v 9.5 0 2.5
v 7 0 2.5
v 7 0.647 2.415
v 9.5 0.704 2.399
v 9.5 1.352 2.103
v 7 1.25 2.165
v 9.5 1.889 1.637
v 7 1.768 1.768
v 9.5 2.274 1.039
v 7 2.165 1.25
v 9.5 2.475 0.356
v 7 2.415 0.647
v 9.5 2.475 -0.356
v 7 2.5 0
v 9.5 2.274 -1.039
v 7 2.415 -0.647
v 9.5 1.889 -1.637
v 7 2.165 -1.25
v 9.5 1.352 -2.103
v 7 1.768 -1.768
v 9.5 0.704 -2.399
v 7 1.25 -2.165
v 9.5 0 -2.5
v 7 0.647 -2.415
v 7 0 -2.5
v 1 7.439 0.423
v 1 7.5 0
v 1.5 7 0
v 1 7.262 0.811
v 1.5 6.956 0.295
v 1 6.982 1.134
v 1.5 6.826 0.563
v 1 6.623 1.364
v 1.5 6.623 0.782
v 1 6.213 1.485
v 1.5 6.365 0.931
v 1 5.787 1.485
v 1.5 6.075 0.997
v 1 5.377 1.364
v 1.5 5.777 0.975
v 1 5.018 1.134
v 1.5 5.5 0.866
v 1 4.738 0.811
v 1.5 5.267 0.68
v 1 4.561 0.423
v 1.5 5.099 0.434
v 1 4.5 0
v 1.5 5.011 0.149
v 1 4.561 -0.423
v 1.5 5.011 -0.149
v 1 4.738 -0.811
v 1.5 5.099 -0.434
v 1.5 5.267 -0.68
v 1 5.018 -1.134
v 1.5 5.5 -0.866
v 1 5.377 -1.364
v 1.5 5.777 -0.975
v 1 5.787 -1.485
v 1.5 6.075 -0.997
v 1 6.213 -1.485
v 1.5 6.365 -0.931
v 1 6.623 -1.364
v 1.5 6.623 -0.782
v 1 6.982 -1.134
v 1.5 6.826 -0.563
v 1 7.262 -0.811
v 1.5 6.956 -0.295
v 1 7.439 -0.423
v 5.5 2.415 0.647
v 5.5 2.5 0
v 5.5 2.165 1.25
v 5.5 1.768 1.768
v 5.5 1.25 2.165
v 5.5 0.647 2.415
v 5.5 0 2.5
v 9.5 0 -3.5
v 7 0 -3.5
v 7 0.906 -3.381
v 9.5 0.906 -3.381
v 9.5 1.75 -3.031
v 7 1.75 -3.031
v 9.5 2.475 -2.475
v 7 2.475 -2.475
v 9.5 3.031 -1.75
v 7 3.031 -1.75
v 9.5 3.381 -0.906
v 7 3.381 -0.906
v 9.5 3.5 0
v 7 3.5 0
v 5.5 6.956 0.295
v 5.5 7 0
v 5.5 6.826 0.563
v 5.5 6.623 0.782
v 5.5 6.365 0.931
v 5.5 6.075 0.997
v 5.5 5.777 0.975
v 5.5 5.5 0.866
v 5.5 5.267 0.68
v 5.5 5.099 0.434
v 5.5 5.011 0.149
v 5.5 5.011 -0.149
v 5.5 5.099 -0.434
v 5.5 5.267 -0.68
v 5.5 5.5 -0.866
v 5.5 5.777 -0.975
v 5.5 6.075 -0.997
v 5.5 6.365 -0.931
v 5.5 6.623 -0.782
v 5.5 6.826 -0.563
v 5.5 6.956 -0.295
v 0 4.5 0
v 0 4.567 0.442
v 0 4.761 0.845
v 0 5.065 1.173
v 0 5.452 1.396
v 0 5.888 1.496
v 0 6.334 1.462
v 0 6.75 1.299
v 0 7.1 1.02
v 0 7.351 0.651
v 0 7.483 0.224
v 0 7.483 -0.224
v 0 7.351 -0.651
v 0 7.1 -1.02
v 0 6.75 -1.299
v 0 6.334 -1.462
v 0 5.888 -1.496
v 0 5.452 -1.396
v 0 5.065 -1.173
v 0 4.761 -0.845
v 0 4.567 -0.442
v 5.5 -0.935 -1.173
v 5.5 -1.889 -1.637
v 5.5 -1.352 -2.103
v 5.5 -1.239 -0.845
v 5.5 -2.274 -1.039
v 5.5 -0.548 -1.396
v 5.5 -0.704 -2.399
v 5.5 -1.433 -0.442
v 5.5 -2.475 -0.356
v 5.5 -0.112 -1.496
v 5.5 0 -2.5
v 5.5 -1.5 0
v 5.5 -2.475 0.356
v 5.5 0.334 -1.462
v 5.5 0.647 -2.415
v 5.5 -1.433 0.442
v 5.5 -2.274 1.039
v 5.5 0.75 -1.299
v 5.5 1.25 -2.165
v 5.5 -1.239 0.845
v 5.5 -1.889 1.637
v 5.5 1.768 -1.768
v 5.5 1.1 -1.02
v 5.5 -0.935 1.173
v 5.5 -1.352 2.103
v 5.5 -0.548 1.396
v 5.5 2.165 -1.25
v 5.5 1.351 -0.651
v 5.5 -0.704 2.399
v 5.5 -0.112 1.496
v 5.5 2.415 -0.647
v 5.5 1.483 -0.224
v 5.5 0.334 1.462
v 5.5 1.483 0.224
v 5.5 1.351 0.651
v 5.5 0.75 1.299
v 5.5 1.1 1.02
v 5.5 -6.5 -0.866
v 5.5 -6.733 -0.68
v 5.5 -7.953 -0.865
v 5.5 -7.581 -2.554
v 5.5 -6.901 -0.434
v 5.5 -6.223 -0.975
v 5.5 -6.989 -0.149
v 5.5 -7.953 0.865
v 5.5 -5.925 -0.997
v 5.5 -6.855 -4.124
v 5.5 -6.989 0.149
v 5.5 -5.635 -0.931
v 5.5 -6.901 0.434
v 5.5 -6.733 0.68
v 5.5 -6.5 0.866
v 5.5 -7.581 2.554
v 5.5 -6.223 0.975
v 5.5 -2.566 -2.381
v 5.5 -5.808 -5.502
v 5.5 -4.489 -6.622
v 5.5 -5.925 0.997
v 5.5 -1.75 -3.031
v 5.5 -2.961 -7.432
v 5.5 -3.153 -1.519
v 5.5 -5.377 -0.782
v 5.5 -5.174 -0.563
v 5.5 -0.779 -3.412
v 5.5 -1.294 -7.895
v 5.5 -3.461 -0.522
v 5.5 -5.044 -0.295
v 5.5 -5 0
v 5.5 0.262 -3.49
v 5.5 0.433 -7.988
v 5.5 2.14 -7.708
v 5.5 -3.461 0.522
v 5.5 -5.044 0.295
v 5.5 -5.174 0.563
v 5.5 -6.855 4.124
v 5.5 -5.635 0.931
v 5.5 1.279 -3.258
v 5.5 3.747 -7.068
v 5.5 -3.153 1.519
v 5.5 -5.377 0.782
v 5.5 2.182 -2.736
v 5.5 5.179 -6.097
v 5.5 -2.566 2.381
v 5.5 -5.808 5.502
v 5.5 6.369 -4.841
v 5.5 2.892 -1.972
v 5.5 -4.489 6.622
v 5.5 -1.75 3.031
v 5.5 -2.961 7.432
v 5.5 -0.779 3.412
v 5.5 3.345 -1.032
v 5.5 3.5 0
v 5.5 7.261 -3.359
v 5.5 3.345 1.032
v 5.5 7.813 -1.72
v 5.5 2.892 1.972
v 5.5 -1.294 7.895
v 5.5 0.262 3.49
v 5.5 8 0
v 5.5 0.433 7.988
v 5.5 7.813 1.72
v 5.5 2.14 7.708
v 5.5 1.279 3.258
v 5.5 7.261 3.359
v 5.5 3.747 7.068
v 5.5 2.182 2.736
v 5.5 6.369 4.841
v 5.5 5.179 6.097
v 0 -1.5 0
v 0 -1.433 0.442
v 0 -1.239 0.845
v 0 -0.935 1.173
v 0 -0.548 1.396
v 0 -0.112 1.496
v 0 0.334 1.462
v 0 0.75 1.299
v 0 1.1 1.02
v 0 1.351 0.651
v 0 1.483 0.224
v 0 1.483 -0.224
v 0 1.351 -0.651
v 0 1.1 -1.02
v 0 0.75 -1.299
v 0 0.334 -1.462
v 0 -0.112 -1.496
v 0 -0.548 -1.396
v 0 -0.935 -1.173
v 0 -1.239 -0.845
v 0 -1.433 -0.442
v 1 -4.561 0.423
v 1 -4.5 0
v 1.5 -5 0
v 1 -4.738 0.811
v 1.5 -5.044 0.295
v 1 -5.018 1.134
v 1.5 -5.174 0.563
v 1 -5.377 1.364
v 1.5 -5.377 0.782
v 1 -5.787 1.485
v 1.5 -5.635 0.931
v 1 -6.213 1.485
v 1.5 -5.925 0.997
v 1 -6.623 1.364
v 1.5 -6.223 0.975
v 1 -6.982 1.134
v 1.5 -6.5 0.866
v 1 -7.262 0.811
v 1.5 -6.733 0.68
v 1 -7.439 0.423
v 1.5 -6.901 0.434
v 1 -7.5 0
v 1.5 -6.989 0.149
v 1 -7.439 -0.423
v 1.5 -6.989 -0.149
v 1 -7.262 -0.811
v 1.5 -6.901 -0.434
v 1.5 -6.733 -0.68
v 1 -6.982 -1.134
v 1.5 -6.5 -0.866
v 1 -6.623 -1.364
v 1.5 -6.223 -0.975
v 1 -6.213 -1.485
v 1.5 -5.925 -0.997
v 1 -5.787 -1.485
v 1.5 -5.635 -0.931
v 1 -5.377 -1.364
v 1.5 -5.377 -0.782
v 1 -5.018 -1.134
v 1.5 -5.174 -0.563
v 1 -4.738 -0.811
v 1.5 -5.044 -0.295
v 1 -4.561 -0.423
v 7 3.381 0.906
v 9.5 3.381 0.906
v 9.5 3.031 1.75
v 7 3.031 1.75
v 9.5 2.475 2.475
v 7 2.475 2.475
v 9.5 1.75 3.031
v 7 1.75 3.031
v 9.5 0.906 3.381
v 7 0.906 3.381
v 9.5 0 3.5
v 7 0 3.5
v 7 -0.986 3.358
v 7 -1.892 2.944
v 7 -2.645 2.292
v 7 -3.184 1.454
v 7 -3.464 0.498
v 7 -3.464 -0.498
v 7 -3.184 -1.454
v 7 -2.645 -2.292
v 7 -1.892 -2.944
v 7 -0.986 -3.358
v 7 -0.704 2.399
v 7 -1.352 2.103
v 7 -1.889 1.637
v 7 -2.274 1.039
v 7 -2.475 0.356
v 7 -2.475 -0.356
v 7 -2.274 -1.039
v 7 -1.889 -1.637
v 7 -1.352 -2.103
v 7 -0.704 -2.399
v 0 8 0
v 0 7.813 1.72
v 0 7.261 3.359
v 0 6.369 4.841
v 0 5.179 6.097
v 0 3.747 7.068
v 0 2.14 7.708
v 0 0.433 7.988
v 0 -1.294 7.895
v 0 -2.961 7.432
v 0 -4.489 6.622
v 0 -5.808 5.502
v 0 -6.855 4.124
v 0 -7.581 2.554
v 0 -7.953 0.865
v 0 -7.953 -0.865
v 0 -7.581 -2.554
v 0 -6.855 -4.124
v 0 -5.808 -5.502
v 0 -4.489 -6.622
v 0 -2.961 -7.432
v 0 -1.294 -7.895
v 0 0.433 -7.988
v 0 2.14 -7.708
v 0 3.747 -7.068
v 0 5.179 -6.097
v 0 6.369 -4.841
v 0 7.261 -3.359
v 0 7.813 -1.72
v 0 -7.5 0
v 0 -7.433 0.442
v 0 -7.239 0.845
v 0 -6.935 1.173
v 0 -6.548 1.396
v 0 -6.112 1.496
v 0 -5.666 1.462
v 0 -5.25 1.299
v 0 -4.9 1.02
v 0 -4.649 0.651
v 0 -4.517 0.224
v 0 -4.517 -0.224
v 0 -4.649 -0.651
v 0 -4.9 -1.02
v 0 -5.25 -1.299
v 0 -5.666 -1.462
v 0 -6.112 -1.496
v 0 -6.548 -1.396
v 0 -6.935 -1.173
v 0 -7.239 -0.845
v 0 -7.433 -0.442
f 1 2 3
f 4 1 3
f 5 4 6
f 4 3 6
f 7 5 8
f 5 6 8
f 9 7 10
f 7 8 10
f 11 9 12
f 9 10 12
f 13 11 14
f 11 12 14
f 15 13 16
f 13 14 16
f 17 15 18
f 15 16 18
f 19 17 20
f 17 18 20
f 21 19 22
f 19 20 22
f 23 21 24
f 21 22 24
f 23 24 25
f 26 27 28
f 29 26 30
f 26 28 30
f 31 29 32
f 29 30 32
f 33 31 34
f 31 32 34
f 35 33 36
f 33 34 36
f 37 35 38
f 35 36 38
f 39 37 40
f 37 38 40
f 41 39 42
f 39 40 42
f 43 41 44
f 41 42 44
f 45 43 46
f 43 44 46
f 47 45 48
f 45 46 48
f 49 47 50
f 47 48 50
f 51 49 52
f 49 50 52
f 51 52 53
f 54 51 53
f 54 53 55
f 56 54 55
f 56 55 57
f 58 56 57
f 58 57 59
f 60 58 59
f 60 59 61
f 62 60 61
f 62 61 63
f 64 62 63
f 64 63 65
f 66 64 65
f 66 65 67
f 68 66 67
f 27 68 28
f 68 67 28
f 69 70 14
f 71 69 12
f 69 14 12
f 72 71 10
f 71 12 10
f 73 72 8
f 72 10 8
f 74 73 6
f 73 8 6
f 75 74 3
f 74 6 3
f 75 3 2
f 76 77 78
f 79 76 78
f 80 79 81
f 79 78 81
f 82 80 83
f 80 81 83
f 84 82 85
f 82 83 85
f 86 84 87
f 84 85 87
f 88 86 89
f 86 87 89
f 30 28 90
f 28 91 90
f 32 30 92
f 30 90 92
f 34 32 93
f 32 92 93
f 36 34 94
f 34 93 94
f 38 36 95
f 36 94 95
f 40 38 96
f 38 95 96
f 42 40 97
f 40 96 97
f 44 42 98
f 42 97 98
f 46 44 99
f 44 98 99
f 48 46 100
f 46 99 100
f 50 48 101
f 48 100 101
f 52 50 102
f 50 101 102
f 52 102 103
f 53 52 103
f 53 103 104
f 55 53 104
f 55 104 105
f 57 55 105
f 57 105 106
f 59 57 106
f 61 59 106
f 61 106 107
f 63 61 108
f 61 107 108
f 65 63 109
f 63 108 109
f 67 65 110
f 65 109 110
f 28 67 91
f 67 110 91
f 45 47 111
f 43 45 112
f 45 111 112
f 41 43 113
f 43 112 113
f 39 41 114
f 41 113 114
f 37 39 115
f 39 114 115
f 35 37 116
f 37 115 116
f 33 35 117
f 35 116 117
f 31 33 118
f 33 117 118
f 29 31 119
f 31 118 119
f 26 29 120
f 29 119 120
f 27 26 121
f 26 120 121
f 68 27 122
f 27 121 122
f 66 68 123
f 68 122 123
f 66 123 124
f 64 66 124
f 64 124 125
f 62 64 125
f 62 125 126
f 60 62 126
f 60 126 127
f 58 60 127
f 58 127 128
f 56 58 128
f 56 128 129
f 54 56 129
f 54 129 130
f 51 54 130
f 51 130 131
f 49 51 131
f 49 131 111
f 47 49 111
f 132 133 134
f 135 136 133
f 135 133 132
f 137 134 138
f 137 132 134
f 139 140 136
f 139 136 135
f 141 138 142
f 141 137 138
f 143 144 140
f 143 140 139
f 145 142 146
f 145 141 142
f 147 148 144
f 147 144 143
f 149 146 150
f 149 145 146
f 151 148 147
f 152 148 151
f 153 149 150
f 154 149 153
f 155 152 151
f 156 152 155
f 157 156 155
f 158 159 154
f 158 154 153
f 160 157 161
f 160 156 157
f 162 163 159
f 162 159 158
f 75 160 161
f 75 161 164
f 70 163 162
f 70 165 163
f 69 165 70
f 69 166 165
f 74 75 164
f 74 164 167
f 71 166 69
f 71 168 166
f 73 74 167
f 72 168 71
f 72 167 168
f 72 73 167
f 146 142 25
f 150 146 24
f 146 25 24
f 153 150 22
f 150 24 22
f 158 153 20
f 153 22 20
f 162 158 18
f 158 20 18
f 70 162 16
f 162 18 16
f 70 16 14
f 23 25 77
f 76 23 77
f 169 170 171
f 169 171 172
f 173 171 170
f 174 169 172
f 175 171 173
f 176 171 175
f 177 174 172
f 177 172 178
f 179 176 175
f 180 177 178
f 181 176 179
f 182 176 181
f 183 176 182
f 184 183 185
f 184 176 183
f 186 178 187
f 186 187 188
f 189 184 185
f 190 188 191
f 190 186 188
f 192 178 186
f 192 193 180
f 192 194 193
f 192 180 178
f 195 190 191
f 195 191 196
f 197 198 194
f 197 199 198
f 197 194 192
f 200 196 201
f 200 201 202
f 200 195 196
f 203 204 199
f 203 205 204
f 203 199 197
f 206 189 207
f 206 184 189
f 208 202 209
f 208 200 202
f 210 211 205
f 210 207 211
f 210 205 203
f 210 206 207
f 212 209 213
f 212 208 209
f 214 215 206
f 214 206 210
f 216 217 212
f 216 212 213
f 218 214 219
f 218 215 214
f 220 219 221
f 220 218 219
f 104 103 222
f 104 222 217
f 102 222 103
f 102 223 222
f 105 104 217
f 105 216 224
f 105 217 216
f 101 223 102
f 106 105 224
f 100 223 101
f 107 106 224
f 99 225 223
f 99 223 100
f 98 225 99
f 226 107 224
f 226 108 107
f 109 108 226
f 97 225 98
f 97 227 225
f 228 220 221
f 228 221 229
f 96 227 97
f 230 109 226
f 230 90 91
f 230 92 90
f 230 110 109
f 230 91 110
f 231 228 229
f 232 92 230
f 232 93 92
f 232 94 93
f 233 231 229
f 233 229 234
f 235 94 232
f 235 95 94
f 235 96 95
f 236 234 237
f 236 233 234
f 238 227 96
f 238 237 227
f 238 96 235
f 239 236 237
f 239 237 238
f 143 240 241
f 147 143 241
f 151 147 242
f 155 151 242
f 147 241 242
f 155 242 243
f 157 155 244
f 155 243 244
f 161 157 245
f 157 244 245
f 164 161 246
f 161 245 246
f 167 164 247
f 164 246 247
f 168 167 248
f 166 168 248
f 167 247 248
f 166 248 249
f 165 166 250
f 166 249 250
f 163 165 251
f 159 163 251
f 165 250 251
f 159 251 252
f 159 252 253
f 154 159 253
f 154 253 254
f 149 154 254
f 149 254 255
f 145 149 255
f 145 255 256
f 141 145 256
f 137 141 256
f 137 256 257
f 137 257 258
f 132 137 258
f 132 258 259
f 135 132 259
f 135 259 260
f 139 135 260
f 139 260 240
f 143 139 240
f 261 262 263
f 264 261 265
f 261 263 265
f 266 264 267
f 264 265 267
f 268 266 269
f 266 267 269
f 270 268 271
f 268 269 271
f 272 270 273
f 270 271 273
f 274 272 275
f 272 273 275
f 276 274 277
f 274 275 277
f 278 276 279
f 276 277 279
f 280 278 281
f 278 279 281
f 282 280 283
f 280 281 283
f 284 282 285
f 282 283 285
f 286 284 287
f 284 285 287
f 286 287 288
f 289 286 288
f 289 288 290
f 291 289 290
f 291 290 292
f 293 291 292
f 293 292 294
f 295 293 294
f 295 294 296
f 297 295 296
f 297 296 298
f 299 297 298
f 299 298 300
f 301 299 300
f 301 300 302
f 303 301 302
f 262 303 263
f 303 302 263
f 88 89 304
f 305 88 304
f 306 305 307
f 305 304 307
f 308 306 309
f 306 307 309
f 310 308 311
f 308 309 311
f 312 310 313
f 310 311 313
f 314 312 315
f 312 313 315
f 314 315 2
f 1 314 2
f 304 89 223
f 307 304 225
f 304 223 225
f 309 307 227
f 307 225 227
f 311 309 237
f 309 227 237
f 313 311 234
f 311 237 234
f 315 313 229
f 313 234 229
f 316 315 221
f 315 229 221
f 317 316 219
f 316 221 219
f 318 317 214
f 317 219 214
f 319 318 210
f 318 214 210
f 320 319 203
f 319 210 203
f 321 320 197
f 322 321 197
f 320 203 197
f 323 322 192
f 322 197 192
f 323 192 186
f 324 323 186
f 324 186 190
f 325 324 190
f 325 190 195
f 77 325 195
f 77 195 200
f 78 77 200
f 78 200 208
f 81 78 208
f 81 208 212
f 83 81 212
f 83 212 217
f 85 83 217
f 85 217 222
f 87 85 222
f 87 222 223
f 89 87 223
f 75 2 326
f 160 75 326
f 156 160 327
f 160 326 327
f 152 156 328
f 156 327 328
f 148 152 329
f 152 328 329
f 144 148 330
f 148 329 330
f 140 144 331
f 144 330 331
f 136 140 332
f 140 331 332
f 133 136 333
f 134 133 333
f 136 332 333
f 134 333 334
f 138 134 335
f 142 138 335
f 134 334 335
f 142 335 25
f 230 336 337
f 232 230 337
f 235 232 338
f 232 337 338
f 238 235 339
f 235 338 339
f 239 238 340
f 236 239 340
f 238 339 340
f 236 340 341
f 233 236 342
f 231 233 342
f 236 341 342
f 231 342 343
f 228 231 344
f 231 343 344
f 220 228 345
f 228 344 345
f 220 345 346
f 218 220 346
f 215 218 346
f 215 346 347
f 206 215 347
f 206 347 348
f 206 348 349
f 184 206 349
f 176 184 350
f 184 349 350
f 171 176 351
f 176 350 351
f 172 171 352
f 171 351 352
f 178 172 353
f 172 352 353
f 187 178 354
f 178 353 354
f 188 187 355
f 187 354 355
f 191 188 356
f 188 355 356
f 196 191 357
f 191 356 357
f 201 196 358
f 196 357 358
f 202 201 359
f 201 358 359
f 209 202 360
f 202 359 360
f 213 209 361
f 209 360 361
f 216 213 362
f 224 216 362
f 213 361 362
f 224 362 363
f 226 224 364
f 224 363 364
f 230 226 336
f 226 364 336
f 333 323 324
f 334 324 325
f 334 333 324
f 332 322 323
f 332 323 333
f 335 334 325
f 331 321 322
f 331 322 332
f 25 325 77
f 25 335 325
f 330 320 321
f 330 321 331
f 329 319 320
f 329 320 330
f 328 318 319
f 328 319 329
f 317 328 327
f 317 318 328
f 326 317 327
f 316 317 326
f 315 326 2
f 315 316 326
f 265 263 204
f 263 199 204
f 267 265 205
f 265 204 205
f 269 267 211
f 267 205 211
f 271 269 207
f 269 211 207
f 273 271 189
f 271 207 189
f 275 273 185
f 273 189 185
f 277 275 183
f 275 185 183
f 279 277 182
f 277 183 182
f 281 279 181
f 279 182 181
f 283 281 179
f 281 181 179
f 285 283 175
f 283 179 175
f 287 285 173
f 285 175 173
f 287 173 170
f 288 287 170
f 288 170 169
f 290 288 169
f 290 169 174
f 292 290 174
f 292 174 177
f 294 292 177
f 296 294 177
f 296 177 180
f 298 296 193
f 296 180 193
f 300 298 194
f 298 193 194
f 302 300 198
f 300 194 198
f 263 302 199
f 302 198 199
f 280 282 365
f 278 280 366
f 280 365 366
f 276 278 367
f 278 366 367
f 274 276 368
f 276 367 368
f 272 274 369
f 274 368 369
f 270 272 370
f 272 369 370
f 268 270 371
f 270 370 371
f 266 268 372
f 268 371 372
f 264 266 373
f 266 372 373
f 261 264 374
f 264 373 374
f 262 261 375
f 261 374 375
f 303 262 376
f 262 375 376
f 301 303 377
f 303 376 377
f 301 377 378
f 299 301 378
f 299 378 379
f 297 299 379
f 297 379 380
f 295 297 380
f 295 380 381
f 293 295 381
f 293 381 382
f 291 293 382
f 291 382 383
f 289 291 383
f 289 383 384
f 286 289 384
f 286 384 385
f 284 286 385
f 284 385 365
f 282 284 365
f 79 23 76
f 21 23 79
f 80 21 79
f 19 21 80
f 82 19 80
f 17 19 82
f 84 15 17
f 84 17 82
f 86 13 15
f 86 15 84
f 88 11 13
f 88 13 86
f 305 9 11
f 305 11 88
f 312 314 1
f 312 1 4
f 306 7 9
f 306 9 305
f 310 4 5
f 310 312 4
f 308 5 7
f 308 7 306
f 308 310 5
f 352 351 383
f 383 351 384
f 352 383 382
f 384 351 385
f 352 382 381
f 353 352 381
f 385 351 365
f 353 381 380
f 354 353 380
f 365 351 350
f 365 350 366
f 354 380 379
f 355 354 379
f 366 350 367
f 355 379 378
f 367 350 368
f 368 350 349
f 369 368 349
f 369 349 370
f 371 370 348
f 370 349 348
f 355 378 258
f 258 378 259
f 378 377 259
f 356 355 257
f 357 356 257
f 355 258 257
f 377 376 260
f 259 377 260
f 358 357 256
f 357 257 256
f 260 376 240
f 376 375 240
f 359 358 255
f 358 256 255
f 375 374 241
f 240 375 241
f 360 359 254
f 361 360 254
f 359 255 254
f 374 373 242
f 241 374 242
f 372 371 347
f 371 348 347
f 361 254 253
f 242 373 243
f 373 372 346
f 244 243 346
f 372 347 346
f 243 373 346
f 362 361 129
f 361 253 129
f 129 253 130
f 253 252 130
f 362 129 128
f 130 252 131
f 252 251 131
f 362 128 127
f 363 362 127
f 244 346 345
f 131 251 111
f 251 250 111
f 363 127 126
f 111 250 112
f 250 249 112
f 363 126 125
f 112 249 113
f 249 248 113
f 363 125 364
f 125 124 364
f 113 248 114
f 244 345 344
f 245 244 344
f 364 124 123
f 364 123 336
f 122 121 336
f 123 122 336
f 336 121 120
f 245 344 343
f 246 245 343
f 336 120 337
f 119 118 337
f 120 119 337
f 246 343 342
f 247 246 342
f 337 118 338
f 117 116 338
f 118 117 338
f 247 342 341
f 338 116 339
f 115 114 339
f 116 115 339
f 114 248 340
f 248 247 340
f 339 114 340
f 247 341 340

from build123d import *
from build123d import SkipClean  # not in build123d's __all__

# Parameters (mm, degrees)
F0_R            = 8
F1_DEPTH        = 5.5
F2_R            = 3.5
F3_DEPTH        = 1.5
F5_DEPTH        = 2.5
F7_DEPTH        = 1.5
F9_D            = 3
F10_R           = 1.5
F11_DEPTH       = 1
F13_D           = 2
F13_CSINK_D     = 3
F13_CSINK_ANGLE = 90


with BuildPart() as f1:
    # F0 (on Right) → F1 (new body)
    with BuildSketch(Plane.YZ):
        Circle(F0_R)
    extrude(amount=F1_DEPTH)

    # F2 (on face) → F3 (join)
    with BuildSketch(Plane.YZ.offset(5.5)):
        Circle(F2_R)
    extrude(amount=F3_DEPTH)

    # F4 (on face) → F5 (join)
    with BuildSketch(Plane.YZ.offset(7)):
        with BuildLine():
            Line((0, -2.5), (0, -3.5))
            ThreePointArc((0, -3.5), (2.4748737342, -2.4748737342), (3.5, 0))
            ThreePointArc((3.5, 0), (2.4748737342, 2.4748737342), (0, 3.5))
            Line((0, 3.5), (0, 2.5))
            ThreePointArc((0, 2.5), (2.5, 0), (0, -2.5))
        make_face()
    extrude(amount=F5_DEPTH)

    # F6 (on face) → F7 (cut)
    with BuildSketch(Plane.YZ.offset(7)):
        with BuildLine():
            ThreePointArc((0, -2.5), (1.767766953, -1.767766953), (2.5, 0))
            ThreePointArc((2.5, 0), (1.767766953, 1.767766953), (0, 2.5))
            ThreePointArc((0, 2.5), (-2.5, 0), (0, -2.5))
        make_face()
    with SkipClean():  # cleaning this boolean's faces spoils the solid; the shape is the same uncleaned
        extrude(amount=-F7_DEPTH, mode=Mode.SUBTRACT)

    # F9 (through all)
    with Locations(Plane.YZ.offset(5.5)):
        with Locations((0, 0)):
            Hole(F9_D / 2)

    # F10 (on face) → F11 (cut)
    with BuildSketch(Plane(origin=(0, 0, 0), x_dir=(0, -1, 0), z_dir=(-1, 0, 0))):
        with Locations((-6, 0)):
            Circle(F10_R)
        with Locations((6, 0)):
            Circle(F10_R)
    extrude(amount=-F11_DEPTH, mode=Mode.SUBTRACT)

    # F13 (through all)
    with Locations(Plane(origin=(1, 0, 0), x_dir=(0, -1, 0), z_dir=(-1, 0, 0))):
        with Locations((-6, 0), (6, 0)):
            CounterSinkHole(F13_D / 2, F13_CSINK_D / 2, counter_sink_angle=F13_CSINK_ANGLE)


solid = f1.part
